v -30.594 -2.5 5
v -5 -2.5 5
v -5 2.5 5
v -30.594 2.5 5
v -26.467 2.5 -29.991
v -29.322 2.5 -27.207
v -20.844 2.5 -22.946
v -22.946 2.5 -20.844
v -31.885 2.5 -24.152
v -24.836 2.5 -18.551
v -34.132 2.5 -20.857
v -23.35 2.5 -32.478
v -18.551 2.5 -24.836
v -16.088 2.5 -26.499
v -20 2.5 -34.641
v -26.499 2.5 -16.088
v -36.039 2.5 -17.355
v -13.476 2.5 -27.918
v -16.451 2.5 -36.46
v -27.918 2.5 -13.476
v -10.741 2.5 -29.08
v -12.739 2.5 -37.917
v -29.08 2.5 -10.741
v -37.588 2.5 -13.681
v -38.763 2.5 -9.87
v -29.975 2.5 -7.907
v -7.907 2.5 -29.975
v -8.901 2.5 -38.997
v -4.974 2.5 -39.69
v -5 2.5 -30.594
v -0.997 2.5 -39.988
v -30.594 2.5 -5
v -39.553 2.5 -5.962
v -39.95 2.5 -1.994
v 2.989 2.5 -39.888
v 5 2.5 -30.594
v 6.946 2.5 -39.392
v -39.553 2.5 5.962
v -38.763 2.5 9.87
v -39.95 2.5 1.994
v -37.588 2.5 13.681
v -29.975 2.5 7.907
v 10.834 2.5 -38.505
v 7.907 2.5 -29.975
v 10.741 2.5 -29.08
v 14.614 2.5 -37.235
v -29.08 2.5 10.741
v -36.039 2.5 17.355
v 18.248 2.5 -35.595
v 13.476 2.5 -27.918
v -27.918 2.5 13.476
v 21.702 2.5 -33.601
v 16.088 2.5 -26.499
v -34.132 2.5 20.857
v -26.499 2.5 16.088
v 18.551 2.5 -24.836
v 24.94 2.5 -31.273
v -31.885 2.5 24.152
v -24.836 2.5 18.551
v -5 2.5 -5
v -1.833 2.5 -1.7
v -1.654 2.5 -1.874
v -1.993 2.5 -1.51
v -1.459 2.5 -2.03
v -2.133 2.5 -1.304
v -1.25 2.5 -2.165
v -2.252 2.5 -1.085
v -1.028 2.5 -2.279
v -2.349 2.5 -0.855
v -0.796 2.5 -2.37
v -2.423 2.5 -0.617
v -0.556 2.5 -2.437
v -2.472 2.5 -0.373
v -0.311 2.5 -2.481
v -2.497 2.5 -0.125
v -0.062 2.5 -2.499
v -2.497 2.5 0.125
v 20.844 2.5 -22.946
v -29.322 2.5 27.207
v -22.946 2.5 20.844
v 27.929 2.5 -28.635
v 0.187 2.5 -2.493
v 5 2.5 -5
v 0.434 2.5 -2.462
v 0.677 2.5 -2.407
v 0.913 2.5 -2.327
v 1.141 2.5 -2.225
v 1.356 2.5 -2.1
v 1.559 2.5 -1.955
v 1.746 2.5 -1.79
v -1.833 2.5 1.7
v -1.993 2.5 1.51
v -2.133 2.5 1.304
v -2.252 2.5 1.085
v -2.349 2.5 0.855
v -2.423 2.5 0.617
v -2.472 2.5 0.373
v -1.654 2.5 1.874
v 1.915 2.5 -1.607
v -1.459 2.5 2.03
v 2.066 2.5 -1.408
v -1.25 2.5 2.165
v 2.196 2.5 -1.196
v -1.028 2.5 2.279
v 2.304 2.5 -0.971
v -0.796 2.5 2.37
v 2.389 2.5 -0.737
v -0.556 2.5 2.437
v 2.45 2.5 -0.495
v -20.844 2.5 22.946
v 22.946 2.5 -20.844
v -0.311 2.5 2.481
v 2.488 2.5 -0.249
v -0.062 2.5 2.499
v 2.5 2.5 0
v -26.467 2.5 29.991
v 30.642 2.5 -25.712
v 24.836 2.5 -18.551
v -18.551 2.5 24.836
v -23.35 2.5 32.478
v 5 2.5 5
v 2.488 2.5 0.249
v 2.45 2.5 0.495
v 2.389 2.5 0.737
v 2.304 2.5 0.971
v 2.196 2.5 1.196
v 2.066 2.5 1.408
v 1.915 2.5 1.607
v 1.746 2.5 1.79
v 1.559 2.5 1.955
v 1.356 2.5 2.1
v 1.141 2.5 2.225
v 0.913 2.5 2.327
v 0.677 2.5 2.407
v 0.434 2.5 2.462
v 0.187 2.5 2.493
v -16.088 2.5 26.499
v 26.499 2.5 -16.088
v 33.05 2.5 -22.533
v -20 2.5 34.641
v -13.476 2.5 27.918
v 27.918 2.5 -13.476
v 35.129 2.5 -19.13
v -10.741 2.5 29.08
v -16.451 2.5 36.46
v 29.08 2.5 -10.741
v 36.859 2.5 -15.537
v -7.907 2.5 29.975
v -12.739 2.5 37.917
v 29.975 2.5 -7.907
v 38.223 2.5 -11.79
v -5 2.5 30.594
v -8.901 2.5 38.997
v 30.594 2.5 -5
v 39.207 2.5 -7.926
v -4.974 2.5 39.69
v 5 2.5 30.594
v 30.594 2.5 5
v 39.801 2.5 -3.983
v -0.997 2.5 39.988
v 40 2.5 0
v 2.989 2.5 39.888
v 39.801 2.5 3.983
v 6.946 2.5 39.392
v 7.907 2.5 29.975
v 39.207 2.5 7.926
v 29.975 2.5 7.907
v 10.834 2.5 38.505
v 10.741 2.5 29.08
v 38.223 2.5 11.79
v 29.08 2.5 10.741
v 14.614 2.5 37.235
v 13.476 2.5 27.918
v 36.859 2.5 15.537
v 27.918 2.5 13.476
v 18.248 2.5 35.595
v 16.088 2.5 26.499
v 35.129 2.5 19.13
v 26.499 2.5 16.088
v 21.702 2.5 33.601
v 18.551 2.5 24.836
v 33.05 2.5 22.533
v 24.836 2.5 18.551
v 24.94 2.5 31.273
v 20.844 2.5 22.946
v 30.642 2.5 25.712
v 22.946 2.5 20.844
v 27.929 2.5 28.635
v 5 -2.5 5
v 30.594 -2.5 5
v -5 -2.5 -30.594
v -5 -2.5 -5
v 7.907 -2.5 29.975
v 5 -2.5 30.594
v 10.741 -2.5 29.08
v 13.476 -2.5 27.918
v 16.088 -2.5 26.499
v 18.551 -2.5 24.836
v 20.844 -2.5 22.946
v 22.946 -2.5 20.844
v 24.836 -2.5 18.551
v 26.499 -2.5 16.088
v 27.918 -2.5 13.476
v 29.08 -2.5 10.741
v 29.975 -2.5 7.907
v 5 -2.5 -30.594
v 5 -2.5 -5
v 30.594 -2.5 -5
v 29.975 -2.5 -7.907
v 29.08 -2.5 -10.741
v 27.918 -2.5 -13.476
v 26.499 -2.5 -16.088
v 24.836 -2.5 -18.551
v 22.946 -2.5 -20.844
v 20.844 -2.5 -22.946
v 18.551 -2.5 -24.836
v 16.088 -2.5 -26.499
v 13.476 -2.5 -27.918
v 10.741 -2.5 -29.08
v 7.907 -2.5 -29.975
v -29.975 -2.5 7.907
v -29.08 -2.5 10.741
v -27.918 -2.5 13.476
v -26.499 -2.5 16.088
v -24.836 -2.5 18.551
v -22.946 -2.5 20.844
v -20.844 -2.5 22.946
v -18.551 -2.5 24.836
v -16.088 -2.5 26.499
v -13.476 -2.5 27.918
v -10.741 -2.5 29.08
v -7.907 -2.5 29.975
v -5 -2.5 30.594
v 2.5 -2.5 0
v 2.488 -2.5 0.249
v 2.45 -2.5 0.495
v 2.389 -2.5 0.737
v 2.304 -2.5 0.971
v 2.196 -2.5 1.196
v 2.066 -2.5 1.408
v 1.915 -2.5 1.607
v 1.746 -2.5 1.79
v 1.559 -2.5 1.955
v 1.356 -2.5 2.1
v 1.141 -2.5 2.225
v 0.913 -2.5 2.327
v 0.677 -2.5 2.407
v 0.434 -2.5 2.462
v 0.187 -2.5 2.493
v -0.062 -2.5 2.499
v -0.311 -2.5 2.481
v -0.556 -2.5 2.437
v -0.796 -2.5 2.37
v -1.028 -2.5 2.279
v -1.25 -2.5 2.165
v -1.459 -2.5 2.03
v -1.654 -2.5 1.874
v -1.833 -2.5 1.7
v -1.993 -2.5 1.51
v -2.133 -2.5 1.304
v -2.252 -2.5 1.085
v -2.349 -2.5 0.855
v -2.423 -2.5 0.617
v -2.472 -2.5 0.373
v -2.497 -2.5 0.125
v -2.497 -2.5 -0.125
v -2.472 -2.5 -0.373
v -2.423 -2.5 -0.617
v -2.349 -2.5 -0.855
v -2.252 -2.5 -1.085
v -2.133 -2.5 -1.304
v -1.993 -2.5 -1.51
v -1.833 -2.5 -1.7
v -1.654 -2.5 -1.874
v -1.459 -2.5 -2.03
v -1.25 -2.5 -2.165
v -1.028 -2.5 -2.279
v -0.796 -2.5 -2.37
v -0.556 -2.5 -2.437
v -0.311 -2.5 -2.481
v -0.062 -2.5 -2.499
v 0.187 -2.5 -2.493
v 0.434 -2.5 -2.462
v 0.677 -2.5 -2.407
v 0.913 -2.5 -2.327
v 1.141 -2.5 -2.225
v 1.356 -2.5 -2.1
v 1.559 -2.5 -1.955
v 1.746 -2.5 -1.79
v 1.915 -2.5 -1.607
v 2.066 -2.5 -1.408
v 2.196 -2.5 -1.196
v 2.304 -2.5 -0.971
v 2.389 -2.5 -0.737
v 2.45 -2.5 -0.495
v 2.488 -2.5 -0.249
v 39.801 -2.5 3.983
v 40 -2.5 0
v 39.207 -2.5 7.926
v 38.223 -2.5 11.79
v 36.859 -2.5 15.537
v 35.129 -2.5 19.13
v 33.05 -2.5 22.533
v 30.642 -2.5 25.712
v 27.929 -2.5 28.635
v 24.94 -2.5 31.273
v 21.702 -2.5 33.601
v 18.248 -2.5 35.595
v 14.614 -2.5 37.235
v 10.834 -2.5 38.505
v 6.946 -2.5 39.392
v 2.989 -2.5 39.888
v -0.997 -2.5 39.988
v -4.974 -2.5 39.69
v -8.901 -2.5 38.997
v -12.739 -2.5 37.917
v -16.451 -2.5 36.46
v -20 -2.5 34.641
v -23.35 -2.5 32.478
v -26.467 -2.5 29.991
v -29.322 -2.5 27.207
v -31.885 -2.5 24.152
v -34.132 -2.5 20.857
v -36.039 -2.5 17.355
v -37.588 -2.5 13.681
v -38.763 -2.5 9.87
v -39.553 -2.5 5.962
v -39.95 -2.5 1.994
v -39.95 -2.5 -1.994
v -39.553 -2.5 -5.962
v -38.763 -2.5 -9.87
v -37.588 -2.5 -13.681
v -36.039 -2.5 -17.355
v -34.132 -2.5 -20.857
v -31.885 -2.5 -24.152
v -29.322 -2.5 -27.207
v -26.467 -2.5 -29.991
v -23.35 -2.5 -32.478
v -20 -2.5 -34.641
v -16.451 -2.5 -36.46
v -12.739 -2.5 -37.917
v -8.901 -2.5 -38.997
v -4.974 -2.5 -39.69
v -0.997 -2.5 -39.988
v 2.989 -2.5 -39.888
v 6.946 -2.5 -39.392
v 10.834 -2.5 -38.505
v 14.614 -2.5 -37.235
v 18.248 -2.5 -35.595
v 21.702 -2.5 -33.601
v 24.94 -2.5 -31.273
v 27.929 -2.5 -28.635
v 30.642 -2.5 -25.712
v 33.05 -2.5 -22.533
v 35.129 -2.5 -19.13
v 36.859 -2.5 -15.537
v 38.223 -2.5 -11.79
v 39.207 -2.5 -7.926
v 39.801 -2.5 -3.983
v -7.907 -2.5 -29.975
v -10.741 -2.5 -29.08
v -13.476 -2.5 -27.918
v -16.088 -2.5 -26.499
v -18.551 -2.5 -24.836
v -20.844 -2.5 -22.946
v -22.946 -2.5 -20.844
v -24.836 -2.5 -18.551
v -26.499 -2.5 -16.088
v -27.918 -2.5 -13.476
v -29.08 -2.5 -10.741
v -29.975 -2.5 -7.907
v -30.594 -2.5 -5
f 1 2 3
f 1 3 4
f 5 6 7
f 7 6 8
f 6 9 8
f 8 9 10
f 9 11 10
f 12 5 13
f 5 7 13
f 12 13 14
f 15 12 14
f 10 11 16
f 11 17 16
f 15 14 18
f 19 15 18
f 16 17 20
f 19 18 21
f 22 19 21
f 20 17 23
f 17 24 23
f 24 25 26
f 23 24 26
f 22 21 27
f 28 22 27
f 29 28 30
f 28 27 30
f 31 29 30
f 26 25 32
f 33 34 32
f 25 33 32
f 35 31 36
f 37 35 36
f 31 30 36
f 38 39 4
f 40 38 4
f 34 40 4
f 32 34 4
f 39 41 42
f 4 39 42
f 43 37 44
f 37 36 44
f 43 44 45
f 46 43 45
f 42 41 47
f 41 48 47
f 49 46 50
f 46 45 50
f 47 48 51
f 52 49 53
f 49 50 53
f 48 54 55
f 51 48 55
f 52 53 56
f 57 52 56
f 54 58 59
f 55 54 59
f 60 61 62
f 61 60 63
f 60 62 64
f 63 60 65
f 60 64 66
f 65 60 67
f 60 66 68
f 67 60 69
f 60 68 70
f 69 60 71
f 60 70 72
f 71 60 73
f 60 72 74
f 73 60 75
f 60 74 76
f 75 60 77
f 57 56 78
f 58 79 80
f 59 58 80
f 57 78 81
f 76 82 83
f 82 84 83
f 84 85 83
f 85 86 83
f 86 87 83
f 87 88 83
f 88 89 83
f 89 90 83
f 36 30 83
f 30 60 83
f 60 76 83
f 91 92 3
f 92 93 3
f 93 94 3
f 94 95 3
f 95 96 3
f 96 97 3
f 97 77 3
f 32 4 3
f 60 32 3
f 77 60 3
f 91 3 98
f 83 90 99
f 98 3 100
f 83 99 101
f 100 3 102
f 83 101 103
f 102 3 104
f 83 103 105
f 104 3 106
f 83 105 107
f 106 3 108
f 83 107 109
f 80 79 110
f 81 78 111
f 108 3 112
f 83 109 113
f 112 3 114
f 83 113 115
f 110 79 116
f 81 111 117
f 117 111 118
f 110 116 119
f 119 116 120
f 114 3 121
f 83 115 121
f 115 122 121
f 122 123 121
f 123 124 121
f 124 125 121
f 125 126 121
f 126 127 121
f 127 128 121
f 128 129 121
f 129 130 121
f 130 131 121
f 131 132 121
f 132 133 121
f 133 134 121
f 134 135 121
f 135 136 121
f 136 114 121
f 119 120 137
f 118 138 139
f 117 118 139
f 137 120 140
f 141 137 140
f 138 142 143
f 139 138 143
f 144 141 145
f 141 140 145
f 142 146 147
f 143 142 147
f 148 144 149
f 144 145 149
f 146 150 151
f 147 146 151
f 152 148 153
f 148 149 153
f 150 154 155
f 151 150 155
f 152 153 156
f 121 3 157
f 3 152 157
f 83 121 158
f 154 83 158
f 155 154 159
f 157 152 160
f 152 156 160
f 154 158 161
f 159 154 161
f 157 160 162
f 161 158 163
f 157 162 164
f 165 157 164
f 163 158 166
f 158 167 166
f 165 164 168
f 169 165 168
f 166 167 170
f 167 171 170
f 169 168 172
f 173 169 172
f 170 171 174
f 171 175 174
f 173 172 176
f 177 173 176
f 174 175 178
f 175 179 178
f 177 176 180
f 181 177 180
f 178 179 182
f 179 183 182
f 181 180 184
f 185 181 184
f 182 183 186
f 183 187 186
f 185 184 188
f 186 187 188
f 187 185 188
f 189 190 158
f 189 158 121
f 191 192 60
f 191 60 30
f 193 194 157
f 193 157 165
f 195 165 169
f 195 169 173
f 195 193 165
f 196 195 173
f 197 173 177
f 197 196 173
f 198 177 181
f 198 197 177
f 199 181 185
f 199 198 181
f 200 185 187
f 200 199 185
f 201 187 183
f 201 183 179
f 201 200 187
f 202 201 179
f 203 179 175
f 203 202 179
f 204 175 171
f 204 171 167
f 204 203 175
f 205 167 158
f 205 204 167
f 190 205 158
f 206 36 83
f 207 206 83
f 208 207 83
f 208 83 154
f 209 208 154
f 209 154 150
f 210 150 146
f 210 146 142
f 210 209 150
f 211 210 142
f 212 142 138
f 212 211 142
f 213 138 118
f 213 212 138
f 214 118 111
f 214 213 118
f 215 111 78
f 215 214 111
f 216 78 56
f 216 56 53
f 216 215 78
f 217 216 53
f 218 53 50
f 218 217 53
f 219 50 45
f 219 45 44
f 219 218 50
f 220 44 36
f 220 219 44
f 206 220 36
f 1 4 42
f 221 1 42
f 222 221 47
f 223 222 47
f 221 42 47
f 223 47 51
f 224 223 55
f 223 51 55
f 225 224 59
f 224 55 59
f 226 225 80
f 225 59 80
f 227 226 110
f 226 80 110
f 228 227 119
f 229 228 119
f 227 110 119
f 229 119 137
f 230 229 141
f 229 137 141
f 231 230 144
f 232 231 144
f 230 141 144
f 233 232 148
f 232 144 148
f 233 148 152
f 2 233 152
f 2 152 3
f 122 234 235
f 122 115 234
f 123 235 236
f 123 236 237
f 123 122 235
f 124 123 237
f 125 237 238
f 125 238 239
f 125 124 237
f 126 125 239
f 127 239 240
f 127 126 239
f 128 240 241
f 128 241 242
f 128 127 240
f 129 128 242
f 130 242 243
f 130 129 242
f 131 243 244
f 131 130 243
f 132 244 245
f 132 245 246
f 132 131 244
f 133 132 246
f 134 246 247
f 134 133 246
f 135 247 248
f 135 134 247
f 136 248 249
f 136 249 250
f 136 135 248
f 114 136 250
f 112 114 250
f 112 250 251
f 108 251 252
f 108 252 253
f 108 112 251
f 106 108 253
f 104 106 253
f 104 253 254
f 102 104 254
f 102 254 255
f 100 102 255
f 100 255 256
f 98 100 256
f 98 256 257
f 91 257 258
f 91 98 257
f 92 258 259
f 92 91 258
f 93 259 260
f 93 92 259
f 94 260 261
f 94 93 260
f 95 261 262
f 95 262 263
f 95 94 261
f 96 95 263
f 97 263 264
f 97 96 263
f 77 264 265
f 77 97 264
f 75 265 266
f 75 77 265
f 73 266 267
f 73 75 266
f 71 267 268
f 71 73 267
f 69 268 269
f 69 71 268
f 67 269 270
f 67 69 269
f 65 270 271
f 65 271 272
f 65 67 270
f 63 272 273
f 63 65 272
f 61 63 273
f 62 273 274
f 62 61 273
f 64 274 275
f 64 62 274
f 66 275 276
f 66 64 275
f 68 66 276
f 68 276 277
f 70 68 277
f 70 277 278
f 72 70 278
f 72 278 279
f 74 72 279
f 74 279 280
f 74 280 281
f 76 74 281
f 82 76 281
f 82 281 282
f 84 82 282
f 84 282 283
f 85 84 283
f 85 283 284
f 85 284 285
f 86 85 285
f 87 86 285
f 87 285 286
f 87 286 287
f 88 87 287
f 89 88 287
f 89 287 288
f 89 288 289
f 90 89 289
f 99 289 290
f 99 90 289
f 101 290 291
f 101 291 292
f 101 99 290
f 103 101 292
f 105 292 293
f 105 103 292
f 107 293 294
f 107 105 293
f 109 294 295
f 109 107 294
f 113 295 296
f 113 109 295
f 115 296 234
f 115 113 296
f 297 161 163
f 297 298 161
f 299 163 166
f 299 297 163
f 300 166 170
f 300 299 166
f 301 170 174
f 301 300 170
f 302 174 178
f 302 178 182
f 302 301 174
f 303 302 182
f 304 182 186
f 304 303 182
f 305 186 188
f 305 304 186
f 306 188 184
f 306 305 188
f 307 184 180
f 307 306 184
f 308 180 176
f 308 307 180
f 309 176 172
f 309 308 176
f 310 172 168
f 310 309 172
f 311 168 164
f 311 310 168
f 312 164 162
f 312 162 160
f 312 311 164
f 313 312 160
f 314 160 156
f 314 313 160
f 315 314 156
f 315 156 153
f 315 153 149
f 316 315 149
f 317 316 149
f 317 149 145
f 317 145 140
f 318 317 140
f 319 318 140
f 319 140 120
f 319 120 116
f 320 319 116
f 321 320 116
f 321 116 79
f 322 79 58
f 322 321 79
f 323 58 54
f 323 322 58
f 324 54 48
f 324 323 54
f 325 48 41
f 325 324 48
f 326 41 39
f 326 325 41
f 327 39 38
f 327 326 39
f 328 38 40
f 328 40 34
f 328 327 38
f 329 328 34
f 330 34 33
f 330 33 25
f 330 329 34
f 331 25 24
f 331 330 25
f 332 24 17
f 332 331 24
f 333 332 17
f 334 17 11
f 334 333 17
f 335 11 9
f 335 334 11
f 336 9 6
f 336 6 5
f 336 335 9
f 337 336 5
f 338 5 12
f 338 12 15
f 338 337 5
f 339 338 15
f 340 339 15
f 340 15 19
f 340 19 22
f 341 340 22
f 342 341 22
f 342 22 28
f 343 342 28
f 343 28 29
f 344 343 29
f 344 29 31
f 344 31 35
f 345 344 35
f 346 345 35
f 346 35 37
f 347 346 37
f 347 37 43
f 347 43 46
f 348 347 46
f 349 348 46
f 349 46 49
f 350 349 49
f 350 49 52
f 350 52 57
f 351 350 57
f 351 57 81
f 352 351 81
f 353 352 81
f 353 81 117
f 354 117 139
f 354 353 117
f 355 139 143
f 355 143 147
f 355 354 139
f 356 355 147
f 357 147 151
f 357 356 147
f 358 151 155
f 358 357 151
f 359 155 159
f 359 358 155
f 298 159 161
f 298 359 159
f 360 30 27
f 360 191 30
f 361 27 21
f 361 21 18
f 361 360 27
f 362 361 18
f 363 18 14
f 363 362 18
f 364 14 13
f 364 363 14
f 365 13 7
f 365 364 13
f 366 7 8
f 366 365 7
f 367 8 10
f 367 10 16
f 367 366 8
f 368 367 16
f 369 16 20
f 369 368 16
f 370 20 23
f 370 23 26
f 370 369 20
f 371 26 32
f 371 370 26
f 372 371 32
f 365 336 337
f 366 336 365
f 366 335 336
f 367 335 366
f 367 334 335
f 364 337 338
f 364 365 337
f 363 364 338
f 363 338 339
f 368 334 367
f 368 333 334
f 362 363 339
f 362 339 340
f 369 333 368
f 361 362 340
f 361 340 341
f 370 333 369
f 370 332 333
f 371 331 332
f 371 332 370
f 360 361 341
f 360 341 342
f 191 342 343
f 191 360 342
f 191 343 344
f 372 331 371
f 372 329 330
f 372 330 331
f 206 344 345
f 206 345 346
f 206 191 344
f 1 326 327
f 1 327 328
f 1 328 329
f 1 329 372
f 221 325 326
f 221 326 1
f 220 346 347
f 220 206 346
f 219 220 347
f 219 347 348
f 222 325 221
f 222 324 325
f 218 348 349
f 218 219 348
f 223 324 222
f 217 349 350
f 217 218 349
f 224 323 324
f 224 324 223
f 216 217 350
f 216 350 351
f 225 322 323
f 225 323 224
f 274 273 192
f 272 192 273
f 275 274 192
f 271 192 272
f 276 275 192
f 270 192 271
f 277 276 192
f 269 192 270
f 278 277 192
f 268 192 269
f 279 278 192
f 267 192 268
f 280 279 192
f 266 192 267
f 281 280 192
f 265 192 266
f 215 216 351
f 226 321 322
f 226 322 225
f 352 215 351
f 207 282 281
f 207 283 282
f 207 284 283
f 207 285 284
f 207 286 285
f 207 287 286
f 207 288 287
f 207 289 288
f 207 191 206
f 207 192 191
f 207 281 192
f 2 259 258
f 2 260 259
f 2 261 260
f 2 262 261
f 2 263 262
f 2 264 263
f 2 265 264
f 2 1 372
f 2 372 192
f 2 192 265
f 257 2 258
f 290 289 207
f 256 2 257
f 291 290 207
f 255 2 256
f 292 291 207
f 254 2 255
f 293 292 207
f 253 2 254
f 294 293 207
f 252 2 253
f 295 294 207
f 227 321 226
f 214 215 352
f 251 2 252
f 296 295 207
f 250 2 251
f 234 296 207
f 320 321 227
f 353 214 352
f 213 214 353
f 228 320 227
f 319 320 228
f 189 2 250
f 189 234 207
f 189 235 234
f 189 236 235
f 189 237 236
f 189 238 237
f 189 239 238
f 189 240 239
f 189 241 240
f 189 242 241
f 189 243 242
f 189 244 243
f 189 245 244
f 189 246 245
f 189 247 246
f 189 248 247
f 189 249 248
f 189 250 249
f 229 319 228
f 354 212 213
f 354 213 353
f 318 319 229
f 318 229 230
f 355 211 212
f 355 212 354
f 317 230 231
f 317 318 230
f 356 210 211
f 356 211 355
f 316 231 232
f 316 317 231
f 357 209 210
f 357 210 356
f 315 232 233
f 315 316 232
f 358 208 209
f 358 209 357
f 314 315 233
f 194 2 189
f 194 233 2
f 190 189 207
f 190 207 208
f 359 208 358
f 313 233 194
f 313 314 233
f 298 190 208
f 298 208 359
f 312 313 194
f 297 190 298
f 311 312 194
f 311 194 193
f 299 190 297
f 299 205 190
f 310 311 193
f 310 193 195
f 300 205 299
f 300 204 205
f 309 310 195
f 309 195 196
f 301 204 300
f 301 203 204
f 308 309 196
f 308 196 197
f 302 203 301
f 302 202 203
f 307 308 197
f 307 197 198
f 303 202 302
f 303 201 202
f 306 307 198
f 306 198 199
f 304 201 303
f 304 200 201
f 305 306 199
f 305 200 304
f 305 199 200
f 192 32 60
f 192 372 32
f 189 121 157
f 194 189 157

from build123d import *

# Parameters (mm, degrees)
F0_R     = 40
F0_R_2   = 2.5
F1_DEPTH = 2.5


with BuildPart() as f1:
    # F0 (on Front) → F1 (new body, symmetric)
    with BuildSketch(Plane.XZ):
        Circle(F0_R)
        with BuildLine():
            Line((-5.59017, -5), (-5, -5))
            Line((-5, -5), (-5, -5.59017))
            Line((-5, -5.59017), (-5, -30.594117))
            ThreePointArc((-5, -30.594117), (-21.92031, -21.92031), (-30.594117, -5))
            Line((-30.594117, -5), (-5.59017, -5))
        make_face(mode=Mode.SUBTRACT)
        with BuildLine():
            Line((5, -30.594117), (5, -5.59017))
            Line((5, -5.59017), (5, -5))
            Line((5, -5), (5.59017, -5))
            Line((5.59017, -5), (30.594117, -5))
            ThreePointArc((30.594117, -5), (21.92031, -21.92031), (5, -30.594117))
        make_face(mode=Mode.SUBTRACT)
        with BuildLine():
            ThreePointArc((-30.594117, 5), (-21.92031, 21.92031), (-5, 30.594117))
            Line((-5, 30.594117), (-5, 5.59017))
            Line((-5, 5.59017), (-5, 5))
            Line((-5, 5), (-5.59017, 5))
            Line((-5.59017, 5), (-30.594117, 5))
        make_face(mode=Mode.SUBTRACT)
        Circle(F0_R_2, mode=Mode.SUBTRACT)
        with BuildLine():
            Line((5.59017, 5), (5, 5))
            Line((5, 5), (5, 5.59017))
            Line((5, 5.59017), (5, 30.594117))
            ThreePointArc((5, 30.594117), (21.92031, 21.92031), (30.594117, 5))
            Line((30.594117, 5), (5.59017, 5))
        make_face(mode=Mode.SUBTRACT)
    extrude(amount=F1_DEPTH, both=True)


solid = f1.part
